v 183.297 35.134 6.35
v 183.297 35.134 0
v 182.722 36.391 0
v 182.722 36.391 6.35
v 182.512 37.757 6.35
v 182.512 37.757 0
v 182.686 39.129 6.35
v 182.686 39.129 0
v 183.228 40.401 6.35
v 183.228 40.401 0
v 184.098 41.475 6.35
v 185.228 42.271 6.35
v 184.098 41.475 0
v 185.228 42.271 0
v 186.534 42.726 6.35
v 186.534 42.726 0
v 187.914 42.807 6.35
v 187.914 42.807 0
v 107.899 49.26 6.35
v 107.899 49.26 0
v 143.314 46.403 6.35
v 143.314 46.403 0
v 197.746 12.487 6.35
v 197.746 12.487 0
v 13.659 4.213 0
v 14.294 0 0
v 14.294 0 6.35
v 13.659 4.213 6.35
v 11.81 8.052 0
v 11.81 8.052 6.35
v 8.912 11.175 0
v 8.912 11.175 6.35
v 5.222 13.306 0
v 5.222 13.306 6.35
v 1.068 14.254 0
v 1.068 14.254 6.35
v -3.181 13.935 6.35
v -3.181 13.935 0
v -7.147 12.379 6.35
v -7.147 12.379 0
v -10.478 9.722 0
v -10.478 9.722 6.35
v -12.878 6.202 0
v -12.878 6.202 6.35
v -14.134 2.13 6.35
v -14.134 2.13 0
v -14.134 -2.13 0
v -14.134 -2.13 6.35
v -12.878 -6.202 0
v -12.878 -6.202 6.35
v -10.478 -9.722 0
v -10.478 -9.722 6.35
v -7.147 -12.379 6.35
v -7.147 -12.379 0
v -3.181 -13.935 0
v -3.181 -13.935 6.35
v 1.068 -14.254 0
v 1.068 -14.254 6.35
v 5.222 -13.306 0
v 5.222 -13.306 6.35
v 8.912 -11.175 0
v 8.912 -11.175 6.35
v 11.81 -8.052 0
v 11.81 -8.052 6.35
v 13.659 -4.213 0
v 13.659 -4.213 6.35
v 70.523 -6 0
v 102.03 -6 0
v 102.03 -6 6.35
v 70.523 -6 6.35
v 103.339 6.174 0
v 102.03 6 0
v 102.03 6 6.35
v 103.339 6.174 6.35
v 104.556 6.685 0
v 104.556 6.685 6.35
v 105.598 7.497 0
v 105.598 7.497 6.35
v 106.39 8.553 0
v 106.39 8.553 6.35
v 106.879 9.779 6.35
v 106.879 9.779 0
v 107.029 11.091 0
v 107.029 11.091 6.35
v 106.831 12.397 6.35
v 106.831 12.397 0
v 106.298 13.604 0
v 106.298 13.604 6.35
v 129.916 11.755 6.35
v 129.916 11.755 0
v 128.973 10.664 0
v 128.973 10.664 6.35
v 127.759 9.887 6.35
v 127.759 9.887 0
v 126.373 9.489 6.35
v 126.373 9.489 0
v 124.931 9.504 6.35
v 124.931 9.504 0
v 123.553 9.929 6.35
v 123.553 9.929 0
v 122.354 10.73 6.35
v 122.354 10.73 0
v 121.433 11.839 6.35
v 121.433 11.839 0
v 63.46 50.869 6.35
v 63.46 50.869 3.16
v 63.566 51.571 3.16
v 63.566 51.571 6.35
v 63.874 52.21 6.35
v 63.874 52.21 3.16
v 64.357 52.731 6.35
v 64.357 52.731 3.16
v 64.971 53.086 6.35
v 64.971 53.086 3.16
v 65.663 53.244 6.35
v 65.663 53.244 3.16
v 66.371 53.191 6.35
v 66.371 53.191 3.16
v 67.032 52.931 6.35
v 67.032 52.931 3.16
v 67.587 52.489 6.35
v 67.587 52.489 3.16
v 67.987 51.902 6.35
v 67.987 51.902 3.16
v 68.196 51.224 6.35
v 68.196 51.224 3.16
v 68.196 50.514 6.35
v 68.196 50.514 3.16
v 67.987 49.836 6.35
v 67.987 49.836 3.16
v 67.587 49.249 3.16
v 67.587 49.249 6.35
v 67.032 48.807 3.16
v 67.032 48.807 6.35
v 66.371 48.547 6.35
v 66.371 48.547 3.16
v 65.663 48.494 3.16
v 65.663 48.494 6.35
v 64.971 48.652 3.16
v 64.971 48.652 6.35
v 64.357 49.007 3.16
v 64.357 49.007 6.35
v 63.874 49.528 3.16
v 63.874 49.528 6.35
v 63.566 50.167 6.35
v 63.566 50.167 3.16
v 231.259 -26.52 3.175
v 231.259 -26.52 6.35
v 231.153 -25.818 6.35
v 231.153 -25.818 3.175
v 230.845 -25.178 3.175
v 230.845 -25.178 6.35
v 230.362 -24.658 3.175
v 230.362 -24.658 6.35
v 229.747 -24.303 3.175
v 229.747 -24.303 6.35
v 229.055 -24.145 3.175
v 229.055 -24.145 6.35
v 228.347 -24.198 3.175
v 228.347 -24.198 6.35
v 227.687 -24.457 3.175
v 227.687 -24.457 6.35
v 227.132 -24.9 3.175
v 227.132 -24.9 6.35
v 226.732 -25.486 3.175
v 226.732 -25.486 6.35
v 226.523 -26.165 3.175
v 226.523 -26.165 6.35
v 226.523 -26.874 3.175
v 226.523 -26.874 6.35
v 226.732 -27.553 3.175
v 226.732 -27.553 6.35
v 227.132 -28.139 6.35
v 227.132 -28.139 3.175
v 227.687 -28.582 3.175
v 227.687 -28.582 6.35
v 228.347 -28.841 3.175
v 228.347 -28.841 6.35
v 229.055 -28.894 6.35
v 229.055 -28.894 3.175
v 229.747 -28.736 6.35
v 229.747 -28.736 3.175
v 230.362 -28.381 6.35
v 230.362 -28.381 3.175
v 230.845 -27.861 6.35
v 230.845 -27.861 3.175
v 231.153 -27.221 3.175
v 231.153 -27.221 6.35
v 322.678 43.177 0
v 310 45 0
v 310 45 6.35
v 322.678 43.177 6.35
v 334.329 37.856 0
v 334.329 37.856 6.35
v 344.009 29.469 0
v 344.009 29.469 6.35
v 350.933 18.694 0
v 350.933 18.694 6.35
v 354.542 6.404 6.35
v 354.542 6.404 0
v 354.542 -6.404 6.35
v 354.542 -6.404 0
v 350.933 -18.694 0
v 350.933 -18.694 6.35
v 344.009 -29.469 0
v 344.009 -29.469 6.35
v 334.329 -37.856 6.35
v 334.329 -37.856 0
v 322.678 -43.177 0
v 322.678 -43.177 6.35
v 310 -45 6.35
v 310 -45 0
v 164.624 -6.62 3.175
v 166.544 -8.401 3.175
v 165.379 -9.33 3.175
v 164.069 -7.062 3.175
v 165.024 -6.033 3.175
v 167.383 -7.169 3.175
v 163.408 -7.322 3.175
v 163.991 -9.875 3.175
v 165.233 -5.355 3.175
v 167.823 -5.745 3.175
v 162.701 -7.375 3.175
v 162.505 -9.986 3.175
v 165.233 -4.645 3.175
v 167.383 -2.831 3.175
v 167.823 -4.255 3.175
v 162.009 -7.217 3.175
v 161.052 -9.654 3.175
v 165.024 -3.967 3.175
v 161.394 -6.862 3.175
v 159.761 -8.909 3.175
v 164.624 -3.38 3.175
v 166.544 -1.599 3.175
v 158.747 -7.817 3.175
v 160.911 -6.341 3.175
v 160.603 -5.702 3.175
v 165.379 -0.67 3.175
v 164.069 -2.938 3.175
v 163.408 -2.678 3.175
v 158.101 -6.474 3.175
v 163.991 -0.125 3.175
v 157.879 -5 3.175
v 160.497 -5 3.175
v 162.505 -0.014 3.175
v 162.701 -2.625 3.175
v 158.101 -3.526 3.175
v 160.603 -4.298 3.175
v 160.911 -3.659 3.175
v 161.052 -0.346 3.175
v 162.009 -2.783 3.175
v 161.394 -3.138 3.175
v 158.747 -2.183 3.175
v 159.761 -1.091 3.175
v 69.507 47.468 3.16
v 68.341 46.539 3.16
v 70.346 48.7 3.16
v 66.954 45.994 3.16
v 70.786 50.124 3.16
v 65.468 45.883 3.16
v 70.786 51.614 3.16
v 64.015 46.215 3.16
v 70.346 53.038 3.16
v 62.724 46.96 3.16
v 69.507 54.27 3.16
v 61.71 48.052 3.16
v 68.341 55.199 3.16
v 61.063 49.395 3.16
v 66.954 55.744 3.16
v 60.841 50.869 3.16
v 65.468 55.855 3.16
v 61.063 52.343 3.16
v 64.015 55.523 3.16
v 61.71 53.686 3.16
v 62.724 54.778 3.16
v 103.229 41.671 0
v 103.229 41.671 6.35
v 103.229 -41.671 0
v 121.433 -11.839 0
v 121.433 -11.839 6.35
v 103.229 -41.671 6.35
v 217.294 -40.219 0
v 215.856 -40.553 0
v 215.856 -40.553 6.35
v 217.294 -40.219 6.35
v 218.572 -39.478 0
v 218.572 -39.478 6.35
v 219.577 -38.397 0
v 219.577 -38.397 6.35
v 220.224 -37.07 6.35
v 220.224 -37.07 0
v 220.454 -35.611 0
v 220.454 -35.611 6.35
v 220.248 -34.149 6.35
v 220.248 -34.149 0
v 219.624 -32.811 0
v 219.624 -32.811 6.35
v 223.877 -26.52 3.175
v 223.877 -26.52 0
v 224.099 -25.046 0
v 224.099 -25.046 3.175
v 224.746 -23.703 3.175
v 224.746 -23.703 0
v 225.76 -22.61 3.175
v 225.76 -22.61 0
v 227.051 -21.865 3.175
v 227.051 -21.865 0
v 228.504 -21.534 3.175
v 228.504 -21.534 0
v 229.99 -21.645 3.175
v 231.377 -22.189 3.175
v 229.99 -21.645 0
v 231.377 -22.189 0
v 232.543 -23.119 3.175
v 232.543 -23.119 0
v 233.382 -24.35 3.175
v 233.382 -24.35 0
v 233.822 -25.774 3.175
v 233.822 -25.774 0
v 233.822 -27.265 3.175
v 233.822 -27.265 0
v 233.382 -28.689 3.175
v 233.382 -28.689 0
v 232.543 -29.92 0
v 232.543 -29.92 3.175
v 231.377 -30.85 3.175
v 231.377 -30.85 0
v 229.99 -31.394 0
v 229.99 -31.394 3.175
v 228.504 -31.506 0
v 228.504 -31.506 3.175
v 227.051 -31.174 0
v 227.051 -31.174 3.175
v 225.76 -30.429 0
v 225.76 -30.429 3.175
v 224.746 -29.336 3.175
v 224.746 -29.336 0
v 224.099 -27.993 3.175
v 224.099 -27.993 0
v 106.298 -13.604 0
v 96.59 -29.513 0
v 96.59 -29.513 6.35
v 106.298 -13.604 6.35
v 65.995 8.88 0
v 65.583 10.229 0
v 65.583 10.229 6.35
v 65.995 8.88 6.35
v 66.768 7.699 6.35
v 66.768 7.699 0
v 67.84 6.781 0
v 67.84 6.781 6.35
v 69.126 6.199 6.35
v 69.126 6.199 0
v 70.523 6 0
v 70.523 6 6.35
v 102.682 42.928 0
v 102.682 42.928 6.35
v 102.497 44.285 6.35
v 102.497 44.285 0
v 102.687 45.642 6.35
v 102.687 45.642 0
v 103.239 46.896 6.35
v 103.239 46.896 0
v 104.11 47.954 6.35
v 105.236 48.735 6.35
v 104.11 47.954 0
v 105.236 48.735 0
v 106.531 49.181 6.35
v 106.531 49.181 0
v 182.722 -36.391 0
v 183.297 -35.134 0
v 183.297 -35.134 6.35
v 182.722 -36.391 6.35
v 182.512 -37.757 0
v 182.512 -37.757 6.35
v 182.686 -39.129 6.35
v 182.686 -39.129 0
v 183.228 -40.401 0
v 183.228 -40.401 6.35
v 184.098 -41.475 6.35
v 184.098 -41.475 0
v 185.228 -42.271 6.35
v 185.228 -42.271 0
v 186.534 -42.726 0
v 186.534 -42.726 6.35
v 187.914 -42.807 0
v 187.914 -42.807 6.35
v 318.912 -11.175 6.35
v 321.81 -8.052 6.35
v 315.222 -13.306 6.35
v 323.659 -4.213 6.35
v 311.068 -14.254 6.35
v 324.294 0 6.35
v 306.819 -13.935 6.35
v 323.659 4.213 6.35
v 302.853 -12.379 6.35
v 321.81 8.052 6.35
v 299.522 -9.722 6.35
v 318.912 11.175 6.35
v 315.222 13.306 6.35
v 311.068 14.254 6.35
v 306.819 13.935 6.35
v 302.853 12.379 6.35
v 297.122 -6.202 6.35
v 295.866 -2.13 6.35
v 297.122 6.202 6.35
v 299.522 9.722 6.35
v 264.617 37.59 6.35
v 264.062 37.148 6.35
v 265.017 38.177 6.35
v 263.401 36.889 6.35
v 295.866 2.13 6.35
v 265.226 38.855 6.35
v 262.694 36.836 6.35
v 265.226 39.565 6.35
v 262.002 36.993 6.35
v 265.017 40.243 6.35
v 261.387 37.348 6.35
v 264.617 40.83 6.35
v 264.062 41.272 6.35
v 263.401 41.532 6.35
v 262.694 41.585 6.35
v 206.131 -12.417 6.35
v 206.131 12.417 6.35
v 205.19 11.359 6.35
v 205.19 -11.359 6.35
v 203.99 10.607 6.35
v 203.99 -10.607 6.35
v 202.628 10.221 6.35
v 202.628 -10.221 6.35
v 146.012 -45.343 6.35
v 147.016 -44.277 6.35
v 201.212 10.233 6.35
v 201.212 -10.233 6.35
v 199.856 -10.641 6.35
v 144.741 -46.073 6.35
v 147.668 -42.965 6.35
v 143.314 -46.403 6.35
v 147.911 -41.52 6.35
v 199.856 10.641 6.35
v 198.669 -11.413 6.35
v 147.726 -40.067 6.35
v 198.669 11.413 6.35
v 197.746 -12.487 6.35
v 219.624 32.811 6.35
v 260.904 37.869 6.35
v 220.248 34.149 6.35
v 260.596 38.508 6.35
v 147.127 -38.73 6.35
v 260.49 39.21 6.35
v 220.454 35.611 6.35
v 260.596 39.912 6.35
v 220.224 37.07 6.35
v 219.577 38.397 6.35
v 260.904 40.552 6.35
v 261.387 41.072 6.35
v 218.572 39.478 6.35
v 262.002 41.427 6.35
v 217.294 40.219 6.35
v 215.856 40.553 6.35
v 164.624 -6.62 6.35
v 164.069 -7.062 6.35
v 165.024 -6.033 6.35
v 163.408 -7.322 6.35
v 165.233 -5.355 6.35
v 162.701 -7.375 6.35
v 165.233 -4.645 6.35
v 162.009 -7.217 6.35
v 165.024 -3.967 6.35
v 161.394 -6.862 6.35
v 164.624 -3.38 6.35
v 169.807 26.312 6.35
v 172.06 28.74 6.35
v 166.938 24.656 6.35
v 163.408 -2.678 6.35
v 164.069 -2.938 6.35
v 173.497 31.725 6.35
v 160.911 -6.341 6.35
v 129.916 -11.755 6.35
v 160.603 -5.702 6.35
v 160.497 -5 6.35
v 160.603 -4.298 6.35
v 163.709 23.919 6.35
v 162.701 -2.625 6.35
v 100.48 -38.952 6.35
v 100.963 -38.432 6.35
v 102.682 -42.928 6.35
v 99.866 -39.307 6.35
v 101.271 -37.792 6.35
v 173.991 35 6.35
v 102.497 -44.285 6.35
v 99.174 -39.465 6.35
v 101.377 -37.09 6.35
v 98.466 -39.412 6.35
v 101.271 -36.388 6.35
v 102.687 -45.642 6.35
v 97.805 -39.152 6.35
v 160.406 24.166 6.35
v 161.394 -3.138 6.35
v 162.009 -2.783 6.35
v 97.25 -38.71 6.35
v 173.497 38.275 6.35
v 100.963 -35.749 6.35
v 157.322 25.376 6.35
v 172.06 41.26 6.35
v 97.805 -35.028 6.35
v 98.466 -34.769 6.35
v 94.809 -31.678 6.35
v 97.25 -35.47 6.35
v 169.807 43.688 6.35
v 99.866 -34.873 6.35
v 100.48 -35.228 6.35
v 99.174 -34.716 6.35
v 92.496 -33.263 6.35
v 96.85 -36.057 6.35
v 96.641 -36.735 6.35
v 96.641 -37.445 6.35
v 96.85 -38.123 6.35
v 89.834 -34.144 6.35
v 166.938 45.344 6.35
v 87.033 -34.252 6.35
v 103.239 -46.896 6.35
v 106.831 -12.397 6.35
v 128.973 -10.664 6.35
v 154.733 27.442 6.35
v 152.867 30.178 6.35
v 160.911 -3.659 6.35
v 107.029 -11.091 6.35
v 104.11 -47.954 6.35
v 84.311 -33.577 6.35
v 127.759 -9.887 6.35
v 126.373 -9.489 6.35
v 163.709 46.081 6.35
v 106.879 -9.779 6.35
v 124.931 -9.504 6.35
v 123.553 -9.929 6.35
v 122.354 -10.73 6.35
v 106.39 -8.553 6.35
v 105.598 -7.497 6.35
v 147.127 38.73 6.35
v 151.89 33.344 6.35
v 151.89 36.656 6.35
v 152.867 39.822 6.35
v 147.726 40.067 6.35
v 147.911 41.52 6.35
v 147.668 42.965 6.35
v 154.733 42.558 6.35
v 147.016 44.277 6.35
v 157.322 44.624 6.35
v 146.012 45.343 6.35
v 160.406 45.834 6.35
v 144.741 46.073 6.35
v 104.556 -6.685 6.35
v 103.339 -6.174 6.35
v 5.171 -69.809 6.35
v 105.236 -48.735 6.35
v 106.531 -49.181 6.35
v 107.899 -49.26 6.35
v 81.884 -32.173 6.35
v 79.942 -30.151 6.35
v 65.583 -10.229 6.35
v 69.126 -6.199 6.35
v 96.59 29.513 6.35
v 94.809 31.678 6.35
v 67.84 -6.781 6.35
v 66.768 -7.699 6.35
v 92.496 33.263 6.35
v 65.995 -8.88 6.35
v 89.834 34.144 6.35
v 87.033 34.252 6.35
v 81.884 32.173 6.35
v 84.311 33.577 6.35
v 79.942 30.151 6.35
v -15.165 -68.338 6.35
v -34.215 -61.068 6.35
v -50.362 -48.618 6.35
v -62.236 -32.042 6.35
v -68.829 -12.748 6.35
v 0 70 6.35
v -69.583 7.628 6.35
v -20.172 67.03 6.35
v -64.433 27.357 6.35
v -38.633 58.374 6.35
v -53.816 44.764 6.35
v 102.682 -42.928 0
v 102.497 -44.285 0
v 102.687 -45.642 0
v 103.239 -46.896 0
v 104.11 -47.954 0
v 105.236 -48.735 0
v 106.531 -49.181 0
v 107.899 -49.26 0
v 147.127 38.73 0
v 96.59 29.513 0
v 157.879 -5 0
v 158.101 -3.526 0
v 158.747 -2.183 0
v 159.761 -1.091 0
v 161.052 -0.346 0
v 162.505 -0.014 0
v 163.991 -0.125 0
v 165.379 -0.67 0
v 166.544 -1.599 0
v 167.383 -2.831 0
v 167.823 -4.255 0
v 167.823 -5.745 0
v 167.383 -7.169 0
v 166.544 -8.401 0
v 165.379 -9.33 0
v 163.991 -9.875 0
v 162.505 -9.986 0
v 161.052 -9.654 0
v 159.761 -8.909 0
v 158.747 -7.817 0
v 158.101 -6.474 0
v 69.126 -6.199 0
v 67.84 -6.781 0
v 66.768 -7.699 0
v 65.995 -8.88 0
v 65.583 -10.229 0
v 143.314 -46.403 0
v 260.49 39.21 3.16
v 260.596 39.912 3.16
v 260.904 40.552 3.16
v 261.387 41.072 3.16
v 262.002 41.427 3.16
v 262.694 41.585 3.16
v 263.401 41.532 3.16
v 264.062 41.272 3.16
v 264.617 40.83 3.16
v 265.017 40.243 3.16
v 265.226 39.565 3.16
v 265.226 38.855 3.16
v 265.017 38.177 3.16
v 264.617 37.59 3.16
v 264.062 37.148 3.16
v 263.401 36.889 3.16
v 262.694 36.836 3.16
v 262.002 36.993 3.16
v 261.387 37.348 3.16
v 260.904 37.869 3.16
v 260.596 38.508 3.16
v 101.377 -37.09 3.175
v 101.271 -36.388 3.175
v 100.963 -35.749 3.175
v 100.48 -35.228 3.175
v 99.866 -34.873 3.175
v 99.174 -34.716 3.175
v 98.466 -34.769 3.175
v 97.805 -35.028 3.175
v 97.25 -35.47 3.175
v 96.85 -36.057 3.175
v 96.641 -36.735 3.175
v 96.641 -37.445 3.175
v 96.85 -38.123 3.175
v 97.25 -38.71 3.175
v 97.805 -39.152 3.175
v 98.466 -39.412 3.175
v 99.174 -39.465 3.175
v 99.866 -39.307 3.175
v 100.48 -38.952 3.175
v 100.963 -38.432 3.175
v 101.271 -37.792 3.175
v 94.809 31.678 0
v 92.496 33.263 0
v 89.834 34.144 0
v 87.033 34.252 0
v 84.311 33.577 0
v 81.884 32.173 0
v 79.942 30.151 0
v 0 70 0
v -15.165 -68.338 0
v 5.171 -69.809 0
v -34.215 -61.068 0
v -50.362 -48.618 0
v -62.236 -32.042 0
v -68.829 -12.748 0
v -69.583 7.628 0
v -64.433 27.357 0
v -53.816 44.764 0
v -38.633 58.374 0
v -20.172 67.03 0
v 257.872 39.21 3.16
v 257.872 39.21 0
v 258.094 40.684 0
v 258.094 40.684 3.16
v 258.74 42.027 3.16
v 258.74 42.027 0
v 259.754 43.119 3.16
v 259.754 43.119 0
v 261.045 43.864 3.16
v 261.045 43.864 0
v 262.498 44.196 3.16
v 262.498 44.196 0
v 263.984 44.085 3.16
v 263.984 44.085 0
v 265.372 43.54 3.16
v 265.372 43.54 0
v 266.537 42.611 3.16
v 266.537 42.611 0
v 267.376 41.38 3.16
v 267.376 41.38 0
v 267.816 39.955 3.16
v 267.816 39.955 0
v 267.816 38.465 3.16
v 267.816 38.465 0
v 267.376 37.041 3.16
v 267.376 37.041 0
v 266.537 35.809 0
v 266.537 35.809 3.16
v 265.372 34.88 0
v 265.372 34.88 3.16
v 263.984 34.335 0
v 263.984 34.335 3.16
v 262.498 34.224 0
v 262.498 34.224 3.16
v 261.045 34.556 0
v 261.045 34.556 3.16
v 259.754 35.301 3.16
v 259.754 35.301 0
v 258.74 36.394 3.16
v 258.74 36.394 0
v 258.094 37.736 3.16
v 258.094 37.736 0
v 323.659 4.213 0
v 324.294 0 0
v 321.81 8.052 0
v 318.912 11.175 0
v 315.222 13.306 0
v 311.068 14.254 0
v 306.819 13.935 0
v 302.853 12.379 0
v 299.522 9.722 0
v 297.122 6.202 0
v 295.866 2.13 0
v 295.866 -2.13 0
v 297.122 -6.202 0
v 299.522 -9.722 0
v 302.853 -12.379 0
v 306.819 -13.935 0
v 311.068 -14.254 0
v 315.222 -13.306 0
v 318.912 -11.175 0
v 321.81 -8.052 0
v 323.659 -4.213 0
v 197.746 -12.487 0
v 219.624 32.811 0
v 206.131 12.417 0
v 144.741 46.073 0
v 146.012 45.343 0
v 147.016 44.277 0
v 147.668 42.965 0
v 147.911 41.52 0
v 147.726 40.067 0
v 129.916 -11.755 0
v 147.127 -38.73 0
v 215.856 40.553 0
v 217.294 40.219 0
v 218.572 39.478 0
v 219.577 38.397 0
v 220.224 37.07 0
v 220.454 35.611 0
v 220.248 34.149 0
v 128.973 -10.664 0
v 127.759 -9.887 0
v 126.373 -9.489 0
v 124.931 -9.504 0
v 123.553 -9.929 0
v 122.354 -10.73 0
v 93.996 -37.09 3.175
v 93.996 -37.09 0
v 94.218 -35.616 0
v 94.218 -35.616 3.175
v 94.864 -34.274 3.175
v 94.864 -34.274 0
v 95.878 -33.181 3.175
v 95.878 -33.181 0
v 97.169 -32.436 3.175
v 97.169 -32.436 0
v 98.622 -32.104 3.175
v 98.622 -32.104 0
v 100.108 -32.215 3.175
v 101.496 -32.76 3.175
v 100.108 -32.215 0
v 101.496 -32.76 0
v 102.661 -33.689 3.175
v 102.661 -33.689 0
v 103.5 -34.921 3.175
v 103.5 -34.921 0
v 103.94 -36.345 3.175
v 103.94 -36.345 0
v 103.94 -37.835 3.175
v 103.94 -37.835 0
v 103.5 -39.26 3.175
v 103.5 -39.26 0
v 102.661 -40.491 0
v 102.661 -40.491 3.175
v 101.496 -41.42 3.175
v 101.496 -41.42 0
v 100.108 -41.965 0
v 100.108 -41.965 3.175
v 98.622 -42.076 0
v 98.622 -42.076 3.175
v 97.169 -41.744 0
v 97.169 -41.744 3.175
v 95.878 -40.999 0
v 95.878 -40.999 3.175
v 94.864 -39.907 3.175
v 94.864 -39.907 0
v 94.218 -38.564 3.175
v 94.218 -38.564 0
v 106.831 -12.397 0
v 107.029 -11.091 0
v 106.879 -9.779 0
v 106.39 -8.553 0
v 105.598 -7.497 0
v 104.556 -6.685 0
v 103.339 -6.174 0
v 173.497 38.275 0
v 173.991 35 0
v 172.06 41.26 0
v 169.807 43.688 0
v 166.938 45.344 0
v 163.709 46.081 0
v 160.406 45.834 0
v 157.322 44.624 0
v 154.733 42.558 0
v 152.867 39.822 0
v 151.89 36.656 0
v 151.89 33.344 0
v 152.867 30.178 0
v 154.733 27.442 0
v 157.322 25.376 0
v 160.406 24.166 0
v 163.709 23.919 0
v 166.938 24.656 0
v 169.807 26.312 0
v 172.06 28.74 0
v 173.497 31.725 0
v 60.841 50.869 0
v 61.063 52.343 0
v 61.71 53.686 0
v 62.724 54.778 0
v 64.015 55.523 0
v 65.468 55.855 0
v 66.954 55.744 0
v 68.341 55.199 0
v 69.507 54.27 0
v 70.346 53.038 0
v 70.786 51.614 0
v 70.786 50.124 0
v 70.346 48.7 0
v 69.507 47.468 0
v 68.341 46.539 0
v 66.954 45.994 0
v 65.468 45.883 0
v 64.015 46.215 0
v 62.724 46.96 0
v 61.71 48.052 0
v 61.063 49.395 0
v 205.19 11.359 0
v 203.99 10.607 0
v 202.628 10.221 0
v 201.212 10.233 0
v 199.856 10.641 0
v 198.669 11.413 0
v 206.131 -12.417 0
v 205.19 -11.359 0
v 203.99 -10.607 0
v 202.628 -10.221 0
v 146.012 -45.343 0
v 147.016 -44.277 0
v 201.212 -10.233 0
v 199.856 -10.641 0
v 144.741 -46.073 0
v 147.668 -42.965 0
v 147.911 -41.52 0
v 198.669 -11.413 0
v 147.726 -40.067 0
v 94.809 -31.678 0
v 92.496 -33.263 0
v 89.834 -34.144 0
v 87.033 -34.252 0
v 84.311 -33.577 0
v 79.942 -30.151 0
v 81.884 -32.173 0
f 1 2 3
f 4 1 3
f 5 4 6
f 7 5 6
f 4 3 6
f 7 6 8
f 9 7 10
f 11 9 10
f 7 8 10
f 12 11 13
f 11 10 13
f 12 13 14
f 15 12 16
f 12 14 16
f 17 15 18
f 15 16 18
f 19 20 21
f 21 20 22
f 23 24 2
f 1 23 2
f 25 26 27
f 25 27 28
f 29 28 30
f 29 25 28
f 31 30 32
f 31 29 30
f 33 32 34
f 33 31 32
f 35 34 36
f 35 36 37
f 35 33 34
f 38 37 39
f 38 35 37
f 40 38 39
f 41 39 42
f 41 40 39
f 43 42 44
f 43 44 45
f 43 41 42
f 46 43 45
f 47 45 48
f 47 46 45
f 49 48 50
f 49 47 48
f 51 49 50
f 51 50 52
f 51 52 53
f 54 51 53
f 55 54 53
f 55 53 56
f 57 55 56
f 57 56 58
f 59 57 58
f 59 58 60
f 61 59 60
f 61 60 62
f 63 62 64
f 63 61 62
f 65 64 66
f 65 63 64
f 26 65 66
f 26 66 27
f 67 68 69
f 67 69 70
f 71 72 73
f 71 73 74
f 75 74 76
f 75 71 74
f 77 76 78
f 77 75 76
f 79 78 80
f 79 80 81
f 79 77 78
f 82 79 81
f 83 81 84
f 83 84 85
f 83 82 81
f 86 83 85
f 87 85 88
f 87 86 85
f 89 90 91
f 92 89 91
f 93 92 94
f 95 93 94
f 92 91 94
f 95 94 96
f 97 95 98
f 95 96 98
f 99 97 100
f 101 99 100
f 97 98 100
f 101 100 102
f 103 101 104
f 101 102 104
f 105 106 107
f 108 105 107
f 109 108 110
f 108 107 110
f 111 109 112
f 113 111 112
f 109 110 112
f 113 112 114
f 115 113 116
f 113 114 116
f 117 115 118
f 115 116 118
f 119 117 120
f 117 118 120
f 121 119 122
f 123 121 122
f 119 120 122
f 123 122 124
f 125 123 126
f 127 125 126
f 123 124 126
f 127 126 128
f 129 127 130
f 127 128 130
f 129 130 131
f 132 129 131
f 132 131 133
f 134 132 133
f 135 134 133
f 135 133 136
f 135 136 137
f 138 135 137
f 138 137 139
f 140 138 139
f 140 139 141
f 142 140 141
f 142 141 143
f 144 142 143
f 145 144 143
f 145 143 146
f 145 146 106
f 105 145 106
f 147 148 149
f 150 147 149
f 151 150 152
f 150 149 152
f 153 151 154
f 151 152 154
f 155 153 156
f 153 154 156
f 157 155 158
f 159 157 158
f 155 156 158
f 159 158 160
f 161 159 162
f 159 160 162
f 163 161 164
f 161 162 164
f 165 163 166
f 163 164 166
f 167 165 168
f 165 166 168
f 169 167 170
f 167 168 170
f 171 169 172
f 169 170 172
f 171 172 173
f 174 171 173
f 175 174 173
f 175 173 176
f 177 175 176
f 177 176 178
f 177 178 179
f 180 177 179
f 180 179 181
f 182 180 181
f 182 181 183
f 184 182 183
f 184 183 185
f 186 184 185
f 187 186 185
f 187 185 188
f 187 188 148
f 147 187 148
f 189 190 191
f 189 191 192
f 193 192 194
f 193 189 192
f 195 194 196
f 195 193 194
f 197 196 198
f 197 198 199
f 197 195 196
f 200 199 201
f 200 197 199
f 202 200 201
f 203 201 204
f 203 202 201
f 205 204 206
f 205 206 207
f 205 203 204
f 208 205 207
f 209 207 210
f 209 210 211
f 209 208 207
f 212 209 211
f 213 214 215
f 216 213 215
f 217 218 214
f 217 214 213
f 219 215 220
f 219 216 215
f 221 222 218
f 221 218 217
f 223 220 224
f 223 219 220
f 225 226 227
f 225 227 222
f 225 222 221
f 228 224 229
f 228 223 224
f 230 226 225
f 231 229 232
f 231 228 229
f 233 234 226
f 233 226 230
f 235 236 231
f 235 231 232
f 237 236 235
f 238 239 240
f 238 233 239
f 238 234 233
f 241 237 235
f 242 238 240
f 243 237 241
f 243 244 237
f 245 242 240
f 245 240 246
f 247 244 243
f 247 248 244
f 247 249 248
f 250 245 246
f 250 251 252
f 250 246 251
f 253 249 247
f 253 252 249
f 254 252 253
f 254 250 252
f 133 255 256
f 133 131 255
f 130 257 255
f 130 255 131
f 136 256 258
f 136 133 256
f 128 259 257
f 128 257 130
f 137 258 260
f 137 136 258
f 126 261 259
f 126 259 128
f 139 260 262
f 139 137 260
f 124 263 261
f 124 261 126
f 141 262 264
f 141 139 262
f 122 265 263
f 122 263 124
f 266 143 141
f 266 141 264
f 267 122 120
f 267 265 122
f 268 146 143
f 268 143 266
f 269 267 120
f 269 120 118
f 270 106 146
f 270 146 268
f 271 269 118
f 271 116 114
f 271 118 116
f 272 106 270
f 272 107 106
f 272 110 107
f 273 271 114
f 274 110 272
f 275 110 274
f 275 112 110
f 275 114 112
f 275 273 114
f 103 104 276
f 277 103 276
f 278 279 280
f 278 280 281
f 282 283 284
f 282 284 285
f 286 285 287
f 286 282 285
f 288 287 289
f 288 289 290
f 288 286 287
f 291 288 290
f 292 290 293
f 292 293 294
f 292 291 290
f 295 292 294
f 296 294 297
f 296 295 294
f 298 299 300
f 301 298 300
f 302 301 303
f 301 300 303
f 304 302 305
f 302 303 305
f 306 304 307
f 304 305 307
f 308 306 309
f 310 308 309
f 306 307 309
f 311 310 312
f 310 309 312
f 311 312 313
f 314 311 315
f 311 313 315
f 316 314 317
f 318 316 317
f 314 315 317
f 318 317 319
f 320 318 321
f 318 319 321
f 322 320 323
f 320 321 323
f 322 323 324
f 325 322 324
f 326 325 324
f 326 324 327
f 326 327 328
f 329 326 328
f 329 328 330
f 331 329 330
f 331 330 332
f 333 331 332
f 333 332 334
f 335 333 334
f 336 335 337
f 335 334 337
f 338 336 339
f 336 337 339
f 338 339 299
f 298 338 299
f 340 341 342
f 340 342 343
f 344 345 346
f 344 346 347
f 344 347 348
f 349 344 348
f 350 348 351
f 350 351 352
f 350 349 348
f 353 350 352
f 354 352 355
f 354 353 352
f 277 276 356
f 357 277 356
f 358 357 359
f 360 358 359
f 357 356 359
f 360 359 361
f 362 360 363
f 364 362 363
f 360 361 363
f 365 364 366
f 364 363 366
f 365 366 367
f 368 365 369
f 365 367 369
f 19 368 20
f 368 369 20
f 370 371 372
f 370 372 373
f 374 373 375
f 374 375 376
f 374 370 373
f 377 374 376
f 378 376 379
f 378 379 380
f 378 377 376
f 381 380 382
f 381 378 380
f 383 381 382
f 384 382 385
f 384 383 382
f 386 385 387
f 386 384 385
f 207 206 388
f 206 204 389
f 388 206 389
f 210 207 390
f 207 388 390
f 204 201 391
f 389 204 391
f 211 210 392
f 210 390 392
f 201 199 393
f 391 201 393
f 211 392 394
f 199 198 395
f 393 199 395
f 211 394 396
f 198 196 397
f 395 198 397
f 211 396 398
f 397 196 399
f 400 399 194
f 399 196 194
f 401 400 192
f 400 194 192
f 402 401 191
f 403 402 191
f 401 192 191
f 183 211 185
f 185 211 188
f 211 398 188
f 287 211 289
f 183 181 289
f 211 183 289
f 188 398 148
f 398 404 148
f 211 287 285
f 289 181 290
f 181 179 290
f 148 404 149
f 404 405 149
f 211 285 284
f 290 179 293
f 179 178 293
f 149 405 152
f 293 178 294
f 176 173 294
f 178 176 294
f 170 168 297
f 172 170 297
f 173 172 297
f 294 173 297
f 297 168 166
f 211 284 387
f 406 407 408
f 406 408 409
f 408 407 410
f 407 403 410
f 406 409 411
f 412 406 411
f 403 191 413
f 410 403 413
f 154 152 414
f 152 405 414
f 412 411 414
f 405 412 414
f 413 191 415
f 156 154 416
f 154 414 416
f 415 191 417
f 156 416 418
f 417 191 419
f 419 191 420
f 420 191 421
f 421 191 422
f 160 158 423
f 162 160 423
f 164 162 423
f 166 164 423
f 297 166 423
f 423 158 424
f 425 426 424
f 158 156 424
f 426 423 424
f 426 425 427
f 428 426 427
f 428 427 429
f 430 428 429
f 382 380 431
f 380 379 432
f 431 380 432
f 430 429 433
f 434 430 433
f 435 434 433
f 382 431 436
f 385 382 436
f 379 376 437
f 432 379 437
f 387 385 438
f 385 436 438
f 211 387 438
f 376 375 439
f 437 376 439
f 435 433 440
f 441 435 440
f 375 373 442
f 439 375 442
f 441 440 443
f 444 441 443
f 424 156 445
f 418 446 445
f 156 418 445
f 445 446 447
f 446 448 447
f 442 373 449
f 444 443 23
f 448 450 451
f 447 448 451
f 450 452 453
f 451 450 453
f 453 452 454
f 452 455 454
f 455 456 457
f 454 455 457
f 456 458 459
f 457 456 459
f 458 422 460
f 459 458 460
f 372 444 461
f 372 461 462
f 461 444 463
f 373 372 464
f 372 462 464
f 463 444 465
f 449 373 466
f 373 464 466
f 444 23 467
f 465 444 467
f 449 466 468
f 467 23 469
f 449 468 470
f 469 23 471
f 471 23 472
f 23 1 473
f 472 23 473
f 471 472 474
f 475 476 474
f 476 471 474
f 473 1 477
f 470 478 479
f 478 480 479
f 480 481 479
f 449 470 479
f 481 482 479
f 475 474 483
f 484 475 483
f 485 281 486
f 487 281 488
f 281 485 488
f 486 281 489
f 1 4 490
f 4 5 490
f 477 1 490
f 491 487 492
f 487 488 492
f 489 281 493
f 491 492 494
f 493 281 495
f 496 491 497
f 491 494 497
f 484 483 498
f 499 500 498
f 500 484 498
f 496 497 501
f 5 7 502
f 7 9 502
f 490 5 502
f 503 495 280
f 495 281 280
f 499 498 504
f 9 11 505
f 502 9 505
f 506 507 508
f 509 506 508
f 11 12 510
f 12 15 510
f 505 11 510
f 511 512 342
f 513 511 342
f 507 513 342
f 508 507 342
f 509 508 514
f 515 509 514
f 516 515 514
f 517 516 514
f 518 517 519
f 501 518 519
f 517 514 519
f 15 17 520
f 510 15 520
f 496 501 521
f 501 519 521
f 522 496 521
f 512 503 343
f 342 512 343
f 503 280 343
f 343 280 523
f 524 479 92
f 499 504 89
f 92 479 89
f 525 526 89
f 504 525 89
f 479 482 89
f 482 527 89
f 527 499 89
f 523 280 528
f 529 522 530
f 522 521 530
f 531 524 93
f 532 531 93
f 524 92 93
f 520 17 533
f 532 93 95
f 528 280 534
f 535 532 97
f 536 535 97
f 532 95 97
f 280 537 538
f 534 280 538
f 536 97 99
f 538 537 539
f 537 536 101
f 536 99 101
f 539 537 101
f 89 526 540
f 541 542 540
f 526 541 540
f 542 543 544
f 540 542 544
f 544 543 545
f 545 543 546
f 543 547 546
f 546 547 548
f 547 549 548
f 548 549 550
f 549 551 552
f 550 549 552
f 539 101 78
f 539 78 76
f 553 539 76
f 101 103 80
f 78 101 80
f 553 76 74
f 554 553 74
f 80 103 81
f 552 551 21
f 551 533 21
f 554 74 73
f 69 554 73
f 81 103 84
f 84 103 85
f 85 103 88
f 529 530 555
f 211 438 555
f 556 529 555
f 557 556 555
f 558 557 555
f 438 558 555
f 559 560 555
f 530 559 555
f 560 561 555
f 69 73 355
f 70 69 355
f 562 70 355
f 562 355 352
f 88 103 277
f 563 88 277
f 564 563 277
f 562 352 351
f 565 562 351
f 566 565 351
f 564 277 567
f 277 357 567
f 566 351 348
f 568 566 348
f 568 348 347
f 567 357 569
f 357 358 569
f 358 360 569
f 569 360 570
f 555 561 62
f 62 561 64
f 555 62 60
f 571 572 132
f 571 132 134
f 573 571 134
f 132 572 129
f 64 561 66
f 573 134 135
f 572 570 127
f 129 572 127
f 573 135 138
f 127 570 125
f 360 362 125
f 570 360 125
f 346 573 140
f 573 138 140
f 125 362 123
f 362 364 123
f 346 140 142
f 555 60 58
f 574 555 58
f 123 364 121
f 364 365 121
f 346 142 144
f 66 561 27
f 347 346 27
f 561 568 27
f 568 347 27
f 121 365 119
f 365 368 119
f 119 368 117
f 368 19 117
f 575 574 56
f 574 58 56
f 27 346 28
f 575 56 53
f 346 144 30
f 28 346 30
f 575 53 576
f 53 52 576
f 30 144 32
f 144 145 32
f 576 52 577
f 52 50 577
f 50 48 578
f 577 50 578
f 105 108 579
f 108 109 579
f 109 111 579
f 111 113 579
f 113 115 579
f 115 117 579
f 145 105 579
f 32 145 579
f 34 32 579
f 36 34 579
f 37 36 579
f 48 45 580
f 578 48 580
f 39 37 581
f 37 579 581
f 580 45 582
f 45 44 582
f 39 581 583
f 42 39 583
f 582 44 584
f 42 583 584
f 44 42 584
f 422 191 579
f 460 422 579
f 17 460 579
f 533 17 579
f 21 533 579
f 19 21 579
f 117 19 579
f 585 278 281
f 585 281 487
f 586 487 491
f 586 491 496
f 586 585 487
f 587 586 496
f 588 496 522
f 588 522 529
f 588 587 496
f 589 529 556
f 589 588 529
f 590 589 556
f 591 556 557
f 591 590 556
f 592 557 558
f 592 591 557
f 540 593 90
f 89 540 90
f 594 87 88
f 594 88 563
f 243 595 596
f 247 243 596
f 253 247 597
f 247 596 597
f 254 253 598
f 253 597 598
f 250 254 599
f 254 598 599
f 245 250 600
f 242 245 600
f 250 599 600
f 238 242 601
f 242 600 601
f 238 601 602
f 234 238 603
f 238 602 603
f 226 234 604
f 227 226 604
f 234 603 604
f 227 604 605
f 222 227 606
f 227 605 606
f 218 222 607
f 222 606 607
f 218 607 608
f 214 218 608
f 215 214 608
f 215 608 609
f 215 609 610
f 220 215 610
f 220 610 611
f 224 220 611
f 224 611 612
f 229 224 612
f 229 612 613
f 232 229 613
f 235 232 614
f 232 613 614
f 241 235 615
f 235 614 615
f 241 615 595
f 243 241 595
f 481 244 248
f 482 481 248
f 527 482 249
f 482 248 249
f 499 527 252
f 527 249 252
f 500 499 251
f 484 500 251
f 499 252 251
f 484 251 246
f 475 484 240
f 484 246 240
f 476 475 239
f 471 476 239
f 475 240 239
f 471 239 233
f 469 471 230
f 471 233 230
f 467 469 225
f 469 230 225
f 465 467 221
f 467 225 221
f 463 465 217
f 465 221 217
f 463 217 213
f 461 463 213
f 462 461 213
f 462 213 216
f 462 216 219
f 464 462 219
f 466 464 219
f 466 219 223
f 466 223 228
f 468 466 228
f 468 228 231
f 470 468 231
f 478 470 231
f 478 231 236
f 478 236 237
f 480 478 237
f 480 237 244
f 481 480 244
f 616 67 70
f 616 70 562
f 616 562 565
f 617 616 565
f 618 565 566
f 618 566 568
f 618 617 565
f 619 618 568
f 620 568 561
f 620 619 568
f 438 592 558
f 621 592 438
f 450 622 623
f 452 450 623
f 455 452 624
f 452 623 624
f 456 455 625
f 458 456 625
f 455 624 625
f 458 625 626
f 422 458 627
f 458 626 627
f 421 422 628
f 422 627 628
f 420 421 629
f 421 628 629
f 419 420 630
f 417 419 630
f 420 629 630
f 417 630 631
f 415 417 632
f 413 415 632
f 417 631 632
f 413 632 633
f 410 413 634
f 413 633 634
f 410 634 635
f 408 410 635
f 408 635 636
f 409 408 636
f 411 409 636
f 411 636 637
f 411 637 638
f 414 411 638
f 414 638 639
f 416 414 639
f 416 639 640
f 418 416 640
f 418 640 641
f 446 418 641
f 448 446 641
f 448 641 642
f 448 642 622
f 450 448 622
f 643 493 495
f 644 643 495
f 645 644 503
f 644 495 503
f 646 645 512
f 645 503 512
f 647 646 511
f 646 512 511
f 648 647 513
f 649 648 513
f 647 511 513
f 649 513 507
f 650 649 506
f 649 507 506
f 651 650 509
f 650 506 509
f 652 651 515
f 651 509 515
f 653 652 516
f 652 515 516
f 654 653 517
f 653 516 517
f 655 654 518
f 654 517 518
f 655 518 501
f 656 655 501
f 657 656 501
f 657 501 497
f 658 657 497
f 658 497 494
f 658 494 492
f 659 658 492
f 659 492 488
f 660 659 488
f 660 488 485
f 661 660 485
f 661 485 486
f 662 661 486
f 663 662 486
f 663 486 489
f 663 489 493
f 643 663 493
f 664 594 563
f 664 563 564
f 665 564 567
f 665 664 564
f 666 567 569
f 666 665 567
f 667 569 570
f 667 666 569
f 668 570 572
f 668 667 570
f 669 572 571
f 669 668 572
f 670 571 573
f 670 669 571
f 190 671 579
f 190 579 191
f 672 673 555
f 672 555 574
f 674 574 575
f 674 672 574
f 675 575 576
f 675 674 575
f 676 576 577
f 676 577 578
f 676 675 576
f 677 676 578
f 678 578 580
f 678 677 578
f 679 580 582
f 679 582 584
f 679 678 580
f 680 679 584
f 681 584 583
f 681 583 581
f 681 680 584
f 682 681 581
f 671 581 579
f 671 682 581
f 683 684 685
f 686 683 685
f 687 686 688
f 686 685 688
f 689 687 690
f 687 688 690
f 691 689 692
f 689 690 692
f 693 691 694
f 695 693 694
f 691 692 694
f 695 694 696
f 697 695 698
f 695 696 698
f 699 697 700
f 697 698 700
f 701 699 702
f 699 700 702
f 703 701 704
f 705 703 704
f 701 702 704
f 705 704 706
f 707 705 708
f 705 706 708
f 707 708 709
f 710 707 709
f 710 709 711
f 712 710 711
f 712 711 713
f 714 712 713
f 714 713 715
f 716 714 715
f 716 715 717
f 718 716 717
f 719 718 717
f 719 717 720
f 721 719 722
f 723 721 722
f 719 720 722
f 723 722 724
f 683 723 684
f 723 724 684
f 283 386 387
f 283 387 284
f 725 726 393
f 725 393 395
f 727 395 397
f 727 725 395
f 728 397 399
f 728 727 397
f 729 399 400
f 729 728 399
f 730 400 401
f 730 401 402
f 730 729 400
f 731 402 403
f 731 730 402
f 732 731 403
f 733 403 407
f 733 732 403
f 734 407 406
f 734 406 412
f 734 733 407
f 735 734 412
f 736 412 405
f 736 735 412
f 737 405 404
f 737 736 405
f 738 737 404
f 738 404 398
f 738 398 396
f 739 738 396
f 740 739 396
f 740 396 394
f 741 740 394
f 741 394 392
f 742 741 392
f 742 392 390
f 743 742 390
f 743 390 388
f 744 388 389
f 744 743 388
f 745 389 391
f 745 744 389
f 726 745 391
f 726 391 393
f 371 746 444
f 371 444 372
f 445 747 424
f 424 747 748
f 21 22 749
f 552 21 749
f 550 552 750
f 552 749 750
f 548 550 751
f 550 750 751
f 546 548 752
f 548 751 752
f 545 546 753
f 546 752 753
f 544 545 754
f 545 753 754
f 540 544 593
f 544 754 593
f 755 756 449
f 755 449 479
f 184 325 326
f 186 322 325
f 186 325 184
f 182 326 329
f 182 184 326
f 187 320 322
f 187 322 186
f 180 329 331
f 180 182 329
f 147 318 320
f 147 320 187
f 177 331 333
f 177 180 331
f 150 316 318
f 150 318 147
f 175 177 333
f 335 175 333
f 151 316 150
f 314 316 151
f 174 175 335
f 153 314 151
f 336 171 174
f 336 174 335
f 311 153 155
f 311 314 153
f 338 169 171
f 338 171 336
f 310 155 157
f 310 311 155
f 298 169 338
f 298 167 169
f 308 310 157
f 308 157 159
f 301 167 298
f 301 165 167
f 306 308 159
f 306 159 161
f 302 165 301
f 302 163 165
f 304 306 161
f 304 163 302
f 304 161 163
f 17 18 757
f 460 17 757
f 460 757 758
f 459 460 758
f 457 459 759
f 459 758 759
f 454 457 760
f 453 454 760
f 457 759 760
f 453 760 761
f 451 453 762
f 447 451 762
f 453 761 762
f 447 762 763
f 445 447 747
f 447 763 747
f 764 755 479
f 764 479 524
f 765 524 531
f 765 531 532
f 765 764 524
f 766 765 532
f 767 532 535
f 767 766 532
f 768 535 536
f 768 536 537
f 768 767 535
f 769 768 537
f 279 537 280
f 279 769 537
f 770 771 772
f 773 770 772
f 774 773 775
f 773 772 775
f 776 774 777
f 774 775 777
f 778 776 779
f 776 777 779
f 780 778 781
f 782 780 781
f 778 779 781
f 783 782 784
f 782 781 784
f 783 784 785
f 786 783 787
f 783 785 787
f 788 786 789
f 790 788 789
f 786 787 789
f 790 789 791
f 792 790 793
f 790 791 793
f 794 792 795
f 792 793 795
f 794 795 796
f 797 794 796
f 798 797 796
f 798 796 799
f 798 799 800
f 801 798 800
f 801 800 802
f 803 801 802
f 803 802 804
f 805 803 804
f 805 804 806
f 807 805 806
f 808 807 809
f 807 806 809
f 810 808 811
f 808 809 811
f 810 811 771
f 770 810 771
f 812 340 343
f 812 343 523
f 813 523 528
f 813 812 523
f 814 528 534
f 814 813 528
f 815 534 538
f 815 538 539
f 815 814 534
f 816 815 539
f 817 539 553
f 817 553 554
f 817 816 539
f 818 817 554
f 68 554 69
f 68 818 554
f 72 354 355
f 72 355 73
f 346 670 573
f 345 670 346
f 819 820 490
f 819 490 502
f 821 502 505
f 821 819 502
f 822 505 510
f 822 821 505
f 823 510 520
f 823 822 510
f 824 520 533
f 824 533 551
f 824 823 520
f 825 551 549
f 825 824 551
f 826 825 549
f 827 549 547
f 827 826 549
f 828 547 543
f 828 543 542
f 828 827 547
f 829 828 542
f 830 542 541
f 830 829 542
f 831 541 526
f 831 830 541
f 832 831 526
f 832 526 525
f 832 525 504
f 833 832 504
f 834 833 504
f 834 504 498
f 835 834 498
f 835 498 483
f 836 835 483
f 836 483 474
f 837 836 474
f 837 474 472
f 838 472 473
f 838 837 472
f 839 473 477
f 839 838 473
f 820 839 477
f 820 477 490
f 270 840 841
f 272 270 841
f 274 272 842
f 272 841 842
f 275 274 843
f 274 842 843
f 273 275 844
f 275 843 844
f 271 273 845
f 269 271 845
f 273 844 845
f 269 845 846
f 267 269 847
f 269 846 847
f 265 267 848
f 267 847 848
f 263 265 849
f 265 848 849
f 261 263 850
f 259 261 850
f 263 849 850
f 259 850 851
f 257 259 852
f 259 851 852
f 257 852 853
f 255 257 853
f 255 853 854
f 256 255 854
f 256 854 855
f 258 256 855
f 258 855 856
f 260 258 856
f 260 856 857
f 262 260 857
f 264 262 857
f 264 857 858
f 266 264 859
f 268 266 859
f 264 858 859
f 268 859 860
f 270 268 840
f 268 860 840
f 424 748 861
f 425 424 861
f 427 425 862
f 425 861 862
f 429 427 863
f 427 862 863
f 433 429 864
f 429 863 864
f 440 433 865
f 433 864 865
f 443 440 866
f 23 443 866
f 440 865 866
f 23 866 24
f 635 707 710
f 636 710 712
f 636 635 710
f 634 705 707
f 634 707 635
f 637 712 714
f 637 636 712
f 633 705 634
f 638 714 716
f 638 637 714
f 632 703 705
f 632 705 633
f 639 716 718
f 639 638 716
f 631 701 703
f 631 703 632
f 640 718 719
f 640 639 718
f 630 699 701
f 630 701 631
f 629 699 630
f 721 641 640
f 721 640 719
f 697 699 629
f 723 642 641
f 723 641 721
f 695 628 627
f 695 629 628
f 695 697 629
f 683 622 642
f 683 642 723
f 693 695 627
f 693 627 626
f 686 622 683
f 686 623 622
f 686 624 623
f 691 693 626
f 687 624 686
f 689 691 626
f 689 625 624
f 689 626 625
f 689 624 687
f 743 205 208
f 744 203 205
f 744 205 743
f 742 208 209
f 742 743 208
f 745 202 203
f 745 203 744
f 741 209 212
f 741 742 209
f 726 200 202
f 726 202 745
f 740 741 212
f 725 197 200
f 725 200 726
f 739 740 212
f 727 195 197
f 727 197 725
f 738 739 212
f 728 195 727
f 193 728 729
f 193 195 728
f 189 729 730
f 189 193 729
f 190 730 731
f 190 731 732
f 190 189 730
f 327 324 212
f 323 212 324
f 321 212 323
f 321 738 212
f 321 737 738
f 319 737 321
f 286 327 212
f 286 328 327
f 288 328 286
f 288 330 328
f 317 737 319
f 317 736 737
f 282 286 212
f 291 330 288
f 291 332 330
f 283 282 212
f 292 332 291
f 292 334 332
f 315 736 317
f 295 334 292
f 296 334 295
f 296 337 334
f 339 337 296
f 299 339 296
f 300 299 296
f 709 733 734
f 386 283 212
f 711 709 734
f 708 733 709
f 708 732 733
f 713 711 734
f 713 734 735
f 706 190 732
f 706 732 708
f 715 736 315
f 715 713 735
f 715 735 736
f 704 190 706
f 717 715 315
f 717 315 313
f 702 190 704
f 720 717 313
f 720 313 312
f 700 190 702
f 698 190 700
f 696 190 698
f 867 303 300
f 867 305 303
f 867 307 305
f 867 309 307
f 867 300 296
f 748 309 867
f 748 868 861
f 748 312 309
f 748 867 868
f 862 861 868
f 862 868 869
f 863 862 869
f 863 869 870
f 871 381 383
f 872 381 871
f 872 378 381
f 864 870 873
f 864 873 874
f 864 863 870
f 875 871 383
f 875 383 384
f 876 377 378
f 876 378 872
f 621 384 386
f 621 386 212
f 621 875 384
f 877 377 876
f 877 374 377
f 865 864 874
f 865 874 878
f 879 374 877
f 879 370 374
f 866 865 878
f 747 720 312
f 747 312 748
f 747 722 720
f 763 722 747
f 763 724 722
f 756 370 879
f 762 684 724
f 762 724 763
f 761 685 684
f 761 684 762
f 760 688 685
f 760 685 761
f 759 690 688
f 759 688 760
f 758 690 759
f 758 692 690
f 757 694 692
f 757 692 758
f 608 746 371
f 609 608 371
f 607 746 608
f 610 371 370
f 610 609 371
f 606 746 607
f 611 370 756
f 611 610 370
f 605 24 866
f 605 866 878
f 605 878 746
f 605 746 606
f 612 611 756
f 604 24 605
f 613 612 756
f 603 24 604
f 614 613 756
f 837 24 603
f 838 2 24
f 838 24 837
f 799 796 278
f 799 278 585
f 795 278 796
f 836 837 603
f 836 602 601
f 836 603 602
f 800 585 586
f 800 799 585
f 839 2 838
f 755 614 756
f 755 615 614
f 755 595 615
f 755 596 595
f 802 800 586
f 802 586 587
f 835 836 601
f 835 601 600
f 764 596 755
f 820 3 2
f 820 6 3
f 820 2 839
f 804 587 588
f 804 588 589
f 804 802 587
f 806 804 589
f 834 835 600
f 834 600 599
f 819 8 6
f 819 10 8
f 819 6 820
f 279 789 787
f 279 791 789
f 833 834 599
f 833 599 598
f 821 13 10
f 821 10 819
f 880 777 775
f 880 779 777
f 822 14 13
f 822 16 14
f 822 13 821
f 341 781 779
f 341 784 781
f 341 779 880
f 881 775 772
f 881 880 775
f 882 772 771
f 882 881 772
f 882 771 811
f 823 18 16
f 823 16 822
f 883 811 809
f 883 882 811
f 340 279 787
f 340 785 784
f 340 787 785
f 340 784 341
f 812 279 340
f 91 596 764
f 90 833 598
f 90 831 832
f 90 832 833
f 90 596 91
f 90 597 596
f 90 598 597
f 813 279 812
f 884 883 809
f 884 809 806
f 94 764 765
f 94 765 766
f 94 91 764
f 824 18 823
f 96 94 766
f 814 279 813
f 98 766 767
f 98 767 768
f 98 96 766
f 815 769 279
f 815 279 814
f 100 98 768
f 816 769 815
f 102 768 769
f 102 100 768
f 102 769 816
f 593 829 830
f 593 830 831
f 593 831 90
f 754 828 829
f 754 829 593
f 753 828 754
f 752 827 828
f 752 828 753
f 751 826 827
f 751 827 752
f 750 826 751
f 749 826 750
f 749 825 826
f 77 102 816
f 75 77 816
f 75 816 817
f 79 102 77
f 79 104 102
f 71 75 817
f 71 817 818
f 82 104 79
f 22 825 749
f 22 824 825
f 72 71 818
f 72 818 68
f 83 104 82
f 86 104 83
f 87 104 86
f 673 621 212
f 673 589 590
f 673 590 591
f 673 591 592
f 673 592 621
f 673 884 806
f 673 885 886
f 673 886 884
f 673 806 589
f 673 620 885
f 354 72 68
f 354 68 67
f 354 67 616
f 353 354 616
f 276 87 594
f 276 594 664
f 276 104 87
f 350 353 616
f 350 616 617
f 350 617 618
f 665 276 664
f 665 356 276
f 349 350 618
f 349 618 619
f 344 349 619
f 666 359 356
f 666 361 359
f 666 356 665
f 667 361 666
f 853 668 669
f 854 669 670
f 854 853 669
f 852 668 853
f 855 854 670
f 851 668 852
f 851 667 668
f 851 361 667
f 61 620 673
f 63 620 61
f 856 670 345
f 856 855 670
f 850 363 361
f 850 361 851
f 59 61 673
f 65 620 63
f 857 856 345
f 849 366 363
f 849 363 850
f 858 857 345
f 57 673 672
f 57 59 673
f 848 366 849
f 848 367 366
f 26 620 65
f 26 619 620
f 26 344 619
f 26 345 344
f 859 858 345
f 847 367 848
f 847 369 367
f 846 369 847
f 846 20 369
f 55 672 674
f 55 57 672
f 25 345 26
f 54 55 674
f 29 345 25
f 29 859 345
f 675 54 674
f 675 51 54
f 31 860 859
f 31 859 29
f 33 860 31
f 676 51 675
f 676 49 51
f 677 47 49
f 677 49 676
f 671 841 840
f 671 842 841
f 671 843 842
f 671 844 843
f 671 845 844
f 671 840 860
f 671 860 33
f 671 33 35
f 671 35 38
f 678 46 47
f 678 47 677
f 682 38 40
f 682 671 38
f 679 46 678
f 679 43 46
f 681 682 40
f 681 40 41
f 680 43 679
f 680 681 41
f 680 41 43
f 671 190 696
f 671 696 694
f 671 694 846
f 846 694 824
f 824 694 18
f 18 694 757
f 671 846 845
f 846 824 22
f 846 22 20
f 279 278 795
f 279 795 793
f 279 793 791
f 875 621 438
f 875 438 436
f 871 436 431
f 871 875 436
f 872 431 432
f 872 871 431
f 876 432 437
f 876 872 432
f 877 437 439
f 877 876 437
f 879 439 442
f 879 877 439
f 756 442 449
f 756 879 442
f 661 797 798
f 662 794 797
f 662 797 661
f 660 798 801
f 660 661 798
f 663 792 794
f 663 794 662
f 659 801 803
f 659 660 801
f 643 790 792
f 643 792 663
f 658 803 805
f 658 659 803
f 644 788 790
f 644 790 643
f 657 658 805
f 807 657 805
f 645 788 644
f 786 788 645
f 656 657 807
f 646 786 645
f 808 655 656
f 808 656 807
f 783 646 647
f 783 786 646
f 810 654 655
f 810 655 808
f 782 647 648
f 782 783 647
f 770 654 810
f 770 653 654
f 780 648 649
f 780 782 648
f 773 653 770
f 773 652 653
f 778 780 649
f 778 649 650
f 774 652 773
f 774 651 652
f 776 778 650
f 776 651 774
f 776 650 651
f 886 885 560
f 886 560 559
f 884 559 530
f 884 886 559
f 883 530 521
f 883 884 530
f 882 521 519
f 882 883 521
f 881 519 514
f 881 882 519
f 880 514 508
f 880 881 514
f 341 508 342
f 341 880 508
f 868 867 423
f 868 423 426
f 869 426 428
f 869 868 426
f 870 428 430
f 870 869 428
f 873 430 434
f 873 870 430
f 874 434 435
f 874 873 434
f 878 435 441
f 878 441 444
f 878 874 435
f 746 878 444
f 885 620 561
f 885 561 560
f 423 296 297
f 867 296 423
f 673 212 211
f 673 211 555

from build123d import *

# Parameters (mm, degrees)
SKETCH1_R             = 14.29385
SKETCH1_R_2           = 11.1125
BOSS_EXTRUDE1_DEPTH   = 6.35
CROQUIS1_R            = 2.38125
CORTAR_EXTRUIR1_DEPTH = 50
CROQUIS4_R            = 5
CORTAR_EXTRUIR2_DEPTH = 3.175
CROQUIS5_R            = 5
CORTAR_EXTRUIR3_DEPTH = 3.175
CROQUIS6_R            = 2.38125
CORTAR_EXTRUIR4_DEPTH = 10
CROQUIS7_R            = 2.38125
CORTAR_EXTRUIR5_DEPTH = 10
CROQUIS8_R            = 5
CORTAR_EXTRUIR6_DEPTH = 3.16


with BuildPart() as part:
    # Sketch1 → Boss-Extrude1 (new body)
    with BuildSketch(Plane.XY):
        with BuildLine():
            Line((0, 70), (310, 45))
            ThreePointArc((310, 45), (355, 0), (310, -45))
            Line((310, -45), (5.171398252, -69.808714643))
            ThreePointArc((5.171398252, -69.808714643), (-69.952162315, -2.587467389), (0, 70))
        make_face()
        Circle(SKETCH1_R, mode=Mode.SUBTRACT)
        with Locations((310, 0)):
            Circle(SKETCH1_R, mode=Mode.SUBTRACT)
        with Locations((162.878542763, 35)):
            Circle(SKETCH1_R_2, mode=Mode.SUBTRACT)
        with BuildLine():
            Line((107.898974887, 49.259511156), (143.314248041, 46.40344074))
            ThreePointArc((143.314248041, 46.40344074), (147.389908855, 43.644764005), (147.127454118, 38.730252238))
            Line((147.127454118, 38.730252238), (129.916226305, 11.754586611))
            ThreePointArc((129.916226305, 11.754586611), (125.651076231, 9.444205574), (121.433006579, 11.839462159))
            Line((121.433006579, 11.839462159), (103.228961238, 41.671198203))
            ThreePointArc((103.228961238, 41.671198203), (103.238833139, 46.896293531), (107.898974887, 49.259511156))
        make_face(mode=Mode.SUBTRACT)
        with BuildLine():
            Line((70.523244027, 6), (102.03004784, 6))
            ThreePointArc((102.03004784, 6), (106.3902351, 8.552804247), (106.298140539, 13.604493178))
            Line((106.298140539, 13.604493178), (96.590354482, 29.513051181))
            ThreePointArc((96.590354482, 29.513051181), (88.437172177, 34.296727565), (79.941746192, 30.151166228))
            Line((79.941746192, 30.151166228), (65.58297828, 10.229432452))
            ThreePointArc((65.58297828, 10.229432452), (67.271539685, 7.201787411), (70.523244027, 6))
        make_face(mode=Mode.SUBTRACT)
        with BuildLine():
            Line((219.623774494, 32.810522613), (206.130928429, 12.417497436))
            ThreePointArc((206.130928429, 12.417497436), (201.919524559, 10.176643248), (197.745901529, 12.48710226))
            Line((197.745901529, 12.48710226), (183.296864227, 35.133505128))
            ThreePointArc((183.296864227, 35.133505128), (183.227765467, 40.400743015), (187.913912204, 42.80669363))
            Line((187.913912204, 42.80669363), (215.855795571, 40.553315939))
            ThreePointArc((215.855795571, 40.553315939), (219.949772588, 37.757395035), (219.623774494, 32.810522613))
        make_face(mode=Mode.SUBTRACT)
        with BuildLine():
            Line((96.590354482, -29.513051181), (106.298140539, -13.604493178))
            ThreePointArc((106.298140539, -13.604493178), (106.3902351, -8.552804247), (102.03004784, -6))
            Line((102.03004784, -6), (70.523244027, -6))
            ThreePointArc((70.523244027, -6), (67.271539685, -7.201787411), (65.58297828, -10.229432452))
            Line((65.58297828, -10.229432452), (79.941746192, -30.151166228))
            ThreePointArc((79.941746192, -30.151166228), (88.437172177, -34.296727565), (96.590354482, -29.513051181))
        make_face(mode=Mode.SUBTRACT)
        with BuildLine():
            Line((187.913912204, -42.80669363), (215.855795571, -40.553315939))
            ThreePointArc((215.855795571, -40.553315939), (219.949772588, -37.757395035), (219.623774494, -32.810522613))
            Line((219.623774494, -32.810522613), (206.130928429, -12.417497436))
            ThreePointArc((206.130928429, -12.417497436), (201.919524559, -10.176643248), (197.745901529, -12.48710226))
            Line((197.745901529, -12.48710226), (183.296864227, -35.133505128))
            ThreePointArc((183.296864227, -35.133505128), (183.227765467, -40.400743015), (187.913912204, -42.80669363))
        make_face(mode=Mode.SUBTRACT)
        with BuildLine():
            Line((121.433006579, -11.839462159), (103.228961238, -41.671198203))
            ThreePointArc((103.228961238, -41.671198203), (103.238833139, -46.896293531), (107.898974887, -49.259511156))
            Line((107.898974887, -49.259511156), (143.314248041, -46.40344074))
            ThreePointArc((143.314248041, -46.40344074), (147.389908855, -43.644764005), (147.127454118, -38.730252238))
            Line((147.127454118, -38.730252238), (129.916226305, -11.754586611))
            ThreePointArc((129.916226305, -11.754586611), (125.651076231, -9.444205574), (121.433006579, -11.839462159))
        make_face(mode=Mode.SUBTRACT)
    extrude(amount=BOSS_EXTRUDE1_DEPTH)

    # Croquis1 → Cortar-Extruir1 (cut)
    with BuildSketch(Plane.XY.offset(6.35)):
        with Locations((98.995555235, -37.090103176)):
            Circle(CROQUIS1_R)
        with Locations((228.877351461, -26.519571404)):
            Circle(CROQUIS1_R)
    extrude(amount=-CORTAR_EXTRUIR1_DEPTH, mode=Mode.SUBTRACT)

    # Croquis4 → Cortar-Extruir2 (cut)
    with BuildSketch(Plane(origin=(0, 0, 0), x_dir=(-1, 0, 0), z_dir=(0, 0, -1))):
        with Locations((-228.877351461, -26.519571404)):
            Circle(CROQUIS4_R)
        with Locations((-98.995555235, -37.090103176)):
            Circle(CROQUIS4_R)
    extrude(amount=-CORTAR_EXTRUIR2_DEPTH, mode=Mode.SUBTRACT)

    # Croquis5 → Cortar-Extruir3 (cut)
    with BuildSketch(Plane(origin=(0, 0, 0), x_dir=(-1, 0, 0), z_dir=(0, 0, -1))):
        with Locations((-162.878542763, -5)):
            Circle(CROQUIS5_R)
    extrude(amount=-CORTAR_EXTRUIR3_DEPTH, mode=Mode.SUBTRACT)

    # Croquis6 → Cortar-Extruir4 (cut)
    with BuildSketch(Plane(origin=(0, 0, 0), x_dir=(-1, 0, 0), z_dir=(0, 0, -1))):
        with Locations((-162.878542763, -5)):
            Circle(CROQUIS6_R)
    extrude(amount=-CORTAR_EXTRUIR4_DEPTH, mode=Mode.SUBTRACT)

    # Croquis7 → Cortar-Extruir5 (cut)
    with BuildSketch(Plane(origin=(0, 0, 0), x_dir=(-1, 0, 0), z_dir=(0, 0, -1))):
        with Locations((-65.84135797, 50.868973694)):
            Circle(CROQUIS7_R)
        with Locations((-262.871569638, 39.210126075)):
            Circle(CROQUIS7_R)
    extrude(amount=-CORTAR_EXTRUIR5_DEPTH, mode=Mode.SUBTRACT)

    # Croquis8 → Cortar-Extruir6 (cut)
    with BuildSketch(Plane(origin=(0, 0, 0), x_dir=(-1, 0, 0), z_dir=(0, 0, -1))):
        with Locations((-262.871569638, 39.210126075)):
            Circle(CROQUIS8_R)
        with Locations((-65.84135797, 50.868973694)):
            Circle(CROQUIS8_R)
    extrude(amount=-CORTAR_EXTRUIR6_DEPTH, mode=Mode.SUBTRACT)


solid = part.part
